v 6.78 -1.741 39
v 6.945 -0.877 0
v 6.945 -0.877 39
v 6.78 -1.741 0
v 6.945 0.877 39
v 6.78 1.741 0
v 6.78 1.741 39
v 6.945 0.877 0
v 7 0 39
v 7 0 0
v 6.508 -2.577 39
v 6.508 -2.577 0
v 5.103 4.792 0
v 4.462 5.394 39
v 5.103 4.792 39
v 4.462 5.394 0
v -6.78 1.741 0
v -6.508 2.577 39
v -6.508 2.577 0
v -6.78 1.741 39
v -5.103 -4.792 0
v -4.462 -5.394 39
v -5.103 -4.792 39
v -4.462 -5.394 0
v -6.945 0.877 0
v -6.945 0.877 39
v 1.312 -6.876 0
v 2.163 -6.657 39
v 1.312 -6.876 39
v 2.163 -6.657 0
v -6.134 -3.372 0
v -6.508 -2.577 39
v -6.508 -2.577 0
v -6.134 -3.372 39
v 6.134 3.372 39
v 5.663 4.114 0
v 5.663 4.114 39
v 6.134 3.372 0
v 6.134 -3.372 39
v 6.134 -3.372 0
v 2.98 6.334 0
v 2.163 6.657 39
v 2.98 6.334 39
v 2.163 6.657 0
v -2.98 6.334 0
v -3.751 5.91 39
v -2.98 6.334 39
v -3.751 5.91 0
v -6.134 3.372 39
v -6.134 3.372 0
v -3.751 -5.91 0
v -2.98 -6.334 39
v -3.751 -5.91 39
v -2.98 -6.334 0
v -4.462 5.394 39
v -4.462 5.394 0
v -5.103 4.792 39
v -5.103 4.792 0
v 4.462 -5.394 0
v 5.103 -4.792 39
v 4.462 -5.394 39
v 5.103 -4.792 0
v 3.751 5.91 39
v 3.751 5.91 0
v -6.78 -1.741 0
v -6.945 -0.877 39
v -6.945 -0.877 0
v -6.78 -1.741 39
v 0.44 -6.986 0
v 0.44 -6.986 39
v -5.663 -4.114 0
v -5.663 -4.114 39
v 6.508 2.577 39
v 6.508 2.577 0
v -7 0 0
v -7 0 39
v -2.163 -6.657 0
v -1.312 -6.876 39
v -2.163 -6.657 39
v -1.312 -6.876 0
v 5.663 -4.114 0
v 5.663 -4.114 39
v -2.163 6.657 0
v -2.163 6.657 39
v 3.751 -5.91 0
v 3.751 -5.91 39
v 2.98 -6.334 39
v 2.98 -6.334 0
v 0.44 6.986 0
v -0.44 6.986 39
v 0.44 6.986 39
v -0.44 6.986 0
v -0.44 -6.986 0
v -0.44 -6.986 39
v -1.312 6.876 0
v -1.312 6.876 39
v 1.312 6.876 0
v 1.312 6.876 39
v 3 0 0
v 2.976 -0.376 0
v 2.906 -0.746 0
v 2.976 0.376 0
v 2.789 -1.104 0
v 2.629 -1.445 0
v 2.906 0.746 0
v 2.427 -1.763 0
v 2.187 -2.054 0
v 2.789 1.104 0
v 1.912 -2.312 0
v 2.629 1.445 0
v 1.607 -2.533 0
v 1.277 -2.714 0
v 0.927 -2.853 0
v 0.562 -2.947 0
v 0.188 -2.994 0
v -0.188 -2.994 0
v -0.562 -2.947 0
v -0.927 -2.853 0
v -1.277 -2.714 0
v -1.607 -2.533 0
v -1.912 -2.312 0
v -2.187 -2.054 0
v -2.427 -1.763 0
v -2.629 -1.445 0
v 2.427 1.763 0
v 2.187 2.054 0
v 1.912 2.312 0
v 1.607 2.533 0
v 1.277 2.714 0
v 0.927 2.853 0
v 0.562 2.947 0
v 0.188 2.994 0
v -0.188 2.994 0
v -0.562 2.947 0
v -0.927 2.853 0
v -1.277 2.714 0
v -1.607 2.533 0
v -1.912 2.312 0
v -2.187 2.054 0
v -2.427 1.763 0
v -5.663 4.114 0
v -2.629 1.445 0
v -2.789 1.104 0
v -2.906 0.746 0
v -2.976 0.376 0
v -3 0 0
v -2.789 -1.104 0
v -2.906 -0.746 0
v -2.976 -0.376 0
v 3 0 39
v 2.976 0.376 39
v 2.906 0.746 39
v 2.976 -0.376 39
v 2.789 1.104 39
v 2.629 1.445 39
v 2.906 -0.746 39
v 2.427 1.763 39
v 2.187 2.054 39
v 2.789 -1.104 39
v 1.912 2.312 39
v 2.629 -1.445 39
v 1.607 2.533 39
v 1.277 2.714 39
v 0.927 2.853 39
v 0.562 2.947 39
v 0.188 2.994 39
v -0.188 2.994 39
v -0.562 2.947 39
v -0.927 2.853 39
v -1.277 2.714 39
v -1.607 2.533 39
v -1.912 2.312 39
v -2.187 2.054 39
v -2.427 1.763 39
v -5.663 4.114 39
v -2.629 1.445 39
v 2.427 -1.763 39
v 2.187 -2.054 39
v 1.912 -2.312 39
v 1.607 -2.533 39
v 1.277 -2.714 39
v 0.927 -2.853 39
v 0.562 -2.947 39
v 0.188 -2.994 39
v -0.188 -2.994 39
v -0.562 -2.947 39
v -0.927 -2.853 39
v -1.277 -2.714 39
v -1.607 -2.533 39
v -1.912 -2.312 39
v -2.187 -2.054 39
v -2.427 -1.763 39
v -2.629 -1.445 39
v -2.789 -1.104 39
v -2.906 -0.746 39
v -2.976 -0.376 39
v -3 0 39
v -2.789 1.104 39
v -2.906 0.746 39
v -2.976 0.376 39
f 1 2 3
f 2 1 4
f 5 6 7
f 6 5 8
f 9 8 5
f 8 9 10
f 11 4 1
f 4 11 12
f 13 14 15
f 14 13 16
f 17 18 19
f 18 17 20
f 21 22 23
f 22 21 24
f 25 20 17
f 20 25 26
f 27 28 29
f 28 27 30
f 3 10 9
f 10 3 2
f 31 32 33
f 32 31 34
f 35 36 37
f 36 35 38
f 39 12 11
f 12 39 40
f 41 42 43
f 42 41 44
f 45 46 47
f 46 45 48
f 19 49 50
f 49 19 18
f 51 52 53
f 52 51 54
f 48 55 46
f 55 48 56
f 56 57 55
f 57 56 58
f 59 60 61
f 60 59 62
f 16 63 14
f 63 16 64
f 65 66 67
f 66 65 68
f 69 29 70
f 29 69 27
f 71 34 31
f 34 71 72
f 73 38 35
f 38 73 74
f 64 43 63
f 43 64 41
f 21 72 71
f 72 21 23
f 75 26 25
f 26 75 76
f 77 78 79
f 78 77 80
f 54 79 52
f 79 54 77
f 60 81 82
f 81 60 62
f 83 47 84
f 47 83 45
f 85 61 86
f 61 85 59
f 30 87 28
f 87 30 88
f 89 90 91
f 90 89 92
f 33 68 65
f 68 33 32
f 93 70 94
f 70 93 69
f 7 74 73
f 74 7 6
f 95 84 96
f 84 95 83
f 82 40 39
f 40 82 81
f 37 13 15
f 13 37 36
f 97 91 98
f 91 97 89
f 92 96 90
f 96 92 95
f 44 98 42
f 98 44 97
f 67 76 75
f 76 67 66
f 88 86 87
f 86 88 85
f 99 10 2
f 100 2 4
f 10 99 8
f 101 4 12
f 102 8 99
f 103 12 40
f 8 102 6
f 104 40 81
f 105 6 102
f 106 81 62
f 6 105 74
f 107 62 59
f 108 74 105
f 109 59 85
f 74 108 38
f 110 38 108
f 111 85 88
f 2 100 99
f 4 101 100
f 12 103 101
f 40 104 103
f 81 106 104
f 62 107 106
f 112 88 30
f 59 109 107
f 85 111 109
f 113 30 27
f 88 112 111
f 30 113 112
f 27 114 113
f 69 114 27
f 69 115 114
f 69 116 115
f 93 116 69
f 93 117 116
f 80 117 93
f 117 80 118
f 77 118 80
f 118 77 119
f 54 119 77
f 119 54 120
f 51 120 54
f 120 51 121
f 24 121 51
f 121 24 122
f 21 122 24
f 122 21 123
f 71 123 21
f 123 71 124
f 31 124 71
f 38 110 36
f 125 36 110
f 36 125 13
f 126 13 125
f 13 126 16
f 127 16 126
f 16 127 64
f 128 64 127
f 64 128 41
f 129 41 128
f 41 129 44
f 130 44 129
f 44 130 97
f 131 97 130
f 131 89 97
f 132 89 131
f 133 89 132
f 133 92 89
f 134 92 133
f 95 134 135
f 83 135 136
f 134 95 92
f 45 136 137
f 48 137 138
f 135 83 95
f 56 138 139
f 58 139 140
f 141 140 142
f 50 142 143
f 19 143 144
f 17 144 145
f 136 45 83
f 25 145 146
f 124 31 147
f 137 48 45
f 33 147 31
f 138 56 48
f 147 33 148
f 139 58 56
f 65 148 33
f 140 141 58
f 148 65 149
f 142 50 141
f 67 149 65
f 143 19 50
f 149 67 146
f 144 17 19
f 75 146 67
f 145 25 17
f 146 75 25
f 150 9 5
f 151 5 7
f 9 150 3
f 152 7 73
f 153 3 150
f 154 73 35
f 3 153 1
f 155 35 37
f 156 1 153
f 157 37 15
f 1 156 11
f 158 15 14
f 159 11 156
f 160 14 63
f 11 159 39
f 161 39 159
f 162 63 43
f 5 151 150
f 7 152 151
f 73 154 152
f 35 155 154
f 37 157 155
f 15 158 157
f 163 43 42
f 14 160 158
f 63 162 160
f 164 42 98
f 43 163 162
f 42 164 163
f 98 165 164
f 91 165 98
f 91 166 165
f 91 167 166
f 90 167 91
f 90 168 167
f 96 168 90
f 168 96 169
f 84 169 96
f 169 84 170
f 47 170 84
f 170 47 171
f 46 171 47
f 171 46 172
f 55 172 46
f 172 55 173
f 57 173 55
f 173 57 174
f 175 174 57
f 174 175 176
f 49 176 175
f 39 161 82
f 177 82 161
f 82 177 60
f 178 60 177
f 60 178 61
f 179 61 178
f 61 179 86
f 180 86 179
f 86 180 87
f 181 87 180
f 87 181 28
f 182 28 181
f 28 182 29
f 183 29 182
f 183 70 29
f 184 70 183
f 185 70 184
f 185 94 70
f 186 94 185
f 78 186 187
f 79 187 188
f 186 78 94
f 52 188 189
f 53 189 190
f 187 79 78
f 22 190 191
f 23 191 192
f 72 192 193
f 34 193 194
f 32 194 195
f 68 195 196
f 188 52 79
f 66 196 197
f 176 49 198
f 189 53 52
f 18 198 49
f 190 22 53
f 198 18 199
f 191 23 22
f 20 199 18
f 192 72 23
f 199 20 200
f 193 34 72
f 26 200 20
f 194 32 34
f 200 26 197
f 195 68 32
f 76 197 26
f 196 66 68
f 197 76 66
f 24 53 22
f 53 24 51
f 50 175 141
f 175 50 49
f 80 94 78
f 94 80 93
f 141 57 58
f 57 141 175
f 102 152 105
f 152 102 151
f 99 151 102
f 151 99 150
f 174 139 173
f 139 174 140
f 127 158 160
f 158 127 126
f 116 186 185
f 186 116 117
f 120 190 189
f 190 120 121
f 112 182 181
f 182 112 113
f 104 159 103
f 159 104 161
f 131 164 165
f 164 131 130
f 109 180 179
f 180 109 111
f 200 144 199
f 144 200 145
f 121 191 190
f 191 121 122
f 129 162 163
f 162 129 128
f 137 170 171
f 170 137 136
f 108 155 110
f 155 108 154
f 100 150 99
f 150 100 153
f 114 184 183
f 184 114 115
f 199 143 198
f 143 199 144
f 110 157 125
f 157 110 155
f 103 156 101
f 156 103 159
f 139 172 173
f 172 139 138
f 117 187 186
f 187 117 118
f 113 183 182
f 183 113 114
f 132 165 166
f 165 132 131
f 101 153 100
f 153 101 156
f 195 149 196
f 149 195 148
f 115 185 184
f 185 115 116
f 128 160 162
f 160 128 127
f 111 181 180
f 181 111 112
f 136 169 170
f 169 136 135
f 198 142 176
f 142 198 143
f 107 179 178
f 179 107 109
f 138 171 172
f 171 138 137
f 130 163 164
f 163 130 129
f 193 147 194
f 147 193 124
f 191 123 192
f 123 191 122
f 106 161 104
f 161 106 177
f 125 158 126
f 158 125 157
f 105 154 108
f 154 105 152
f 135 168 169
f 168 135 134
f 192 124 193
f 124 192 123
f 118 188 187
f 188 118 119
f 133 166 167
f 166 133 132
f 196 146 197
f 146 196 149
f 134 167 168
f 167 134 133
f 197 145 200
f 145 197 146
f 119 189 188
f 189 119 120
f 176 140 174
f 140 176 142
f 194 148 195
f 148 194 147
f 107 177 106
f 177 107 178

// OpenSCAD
$fn = 50;


difference() {
	union() {
		cylinder(h = 39, r = 7.0000000000);
	}
	union() {
		translate(v = [0, 0, -100]) {
			cylinder(h = 200, r = 3.0000000000);
		}
	}
}
